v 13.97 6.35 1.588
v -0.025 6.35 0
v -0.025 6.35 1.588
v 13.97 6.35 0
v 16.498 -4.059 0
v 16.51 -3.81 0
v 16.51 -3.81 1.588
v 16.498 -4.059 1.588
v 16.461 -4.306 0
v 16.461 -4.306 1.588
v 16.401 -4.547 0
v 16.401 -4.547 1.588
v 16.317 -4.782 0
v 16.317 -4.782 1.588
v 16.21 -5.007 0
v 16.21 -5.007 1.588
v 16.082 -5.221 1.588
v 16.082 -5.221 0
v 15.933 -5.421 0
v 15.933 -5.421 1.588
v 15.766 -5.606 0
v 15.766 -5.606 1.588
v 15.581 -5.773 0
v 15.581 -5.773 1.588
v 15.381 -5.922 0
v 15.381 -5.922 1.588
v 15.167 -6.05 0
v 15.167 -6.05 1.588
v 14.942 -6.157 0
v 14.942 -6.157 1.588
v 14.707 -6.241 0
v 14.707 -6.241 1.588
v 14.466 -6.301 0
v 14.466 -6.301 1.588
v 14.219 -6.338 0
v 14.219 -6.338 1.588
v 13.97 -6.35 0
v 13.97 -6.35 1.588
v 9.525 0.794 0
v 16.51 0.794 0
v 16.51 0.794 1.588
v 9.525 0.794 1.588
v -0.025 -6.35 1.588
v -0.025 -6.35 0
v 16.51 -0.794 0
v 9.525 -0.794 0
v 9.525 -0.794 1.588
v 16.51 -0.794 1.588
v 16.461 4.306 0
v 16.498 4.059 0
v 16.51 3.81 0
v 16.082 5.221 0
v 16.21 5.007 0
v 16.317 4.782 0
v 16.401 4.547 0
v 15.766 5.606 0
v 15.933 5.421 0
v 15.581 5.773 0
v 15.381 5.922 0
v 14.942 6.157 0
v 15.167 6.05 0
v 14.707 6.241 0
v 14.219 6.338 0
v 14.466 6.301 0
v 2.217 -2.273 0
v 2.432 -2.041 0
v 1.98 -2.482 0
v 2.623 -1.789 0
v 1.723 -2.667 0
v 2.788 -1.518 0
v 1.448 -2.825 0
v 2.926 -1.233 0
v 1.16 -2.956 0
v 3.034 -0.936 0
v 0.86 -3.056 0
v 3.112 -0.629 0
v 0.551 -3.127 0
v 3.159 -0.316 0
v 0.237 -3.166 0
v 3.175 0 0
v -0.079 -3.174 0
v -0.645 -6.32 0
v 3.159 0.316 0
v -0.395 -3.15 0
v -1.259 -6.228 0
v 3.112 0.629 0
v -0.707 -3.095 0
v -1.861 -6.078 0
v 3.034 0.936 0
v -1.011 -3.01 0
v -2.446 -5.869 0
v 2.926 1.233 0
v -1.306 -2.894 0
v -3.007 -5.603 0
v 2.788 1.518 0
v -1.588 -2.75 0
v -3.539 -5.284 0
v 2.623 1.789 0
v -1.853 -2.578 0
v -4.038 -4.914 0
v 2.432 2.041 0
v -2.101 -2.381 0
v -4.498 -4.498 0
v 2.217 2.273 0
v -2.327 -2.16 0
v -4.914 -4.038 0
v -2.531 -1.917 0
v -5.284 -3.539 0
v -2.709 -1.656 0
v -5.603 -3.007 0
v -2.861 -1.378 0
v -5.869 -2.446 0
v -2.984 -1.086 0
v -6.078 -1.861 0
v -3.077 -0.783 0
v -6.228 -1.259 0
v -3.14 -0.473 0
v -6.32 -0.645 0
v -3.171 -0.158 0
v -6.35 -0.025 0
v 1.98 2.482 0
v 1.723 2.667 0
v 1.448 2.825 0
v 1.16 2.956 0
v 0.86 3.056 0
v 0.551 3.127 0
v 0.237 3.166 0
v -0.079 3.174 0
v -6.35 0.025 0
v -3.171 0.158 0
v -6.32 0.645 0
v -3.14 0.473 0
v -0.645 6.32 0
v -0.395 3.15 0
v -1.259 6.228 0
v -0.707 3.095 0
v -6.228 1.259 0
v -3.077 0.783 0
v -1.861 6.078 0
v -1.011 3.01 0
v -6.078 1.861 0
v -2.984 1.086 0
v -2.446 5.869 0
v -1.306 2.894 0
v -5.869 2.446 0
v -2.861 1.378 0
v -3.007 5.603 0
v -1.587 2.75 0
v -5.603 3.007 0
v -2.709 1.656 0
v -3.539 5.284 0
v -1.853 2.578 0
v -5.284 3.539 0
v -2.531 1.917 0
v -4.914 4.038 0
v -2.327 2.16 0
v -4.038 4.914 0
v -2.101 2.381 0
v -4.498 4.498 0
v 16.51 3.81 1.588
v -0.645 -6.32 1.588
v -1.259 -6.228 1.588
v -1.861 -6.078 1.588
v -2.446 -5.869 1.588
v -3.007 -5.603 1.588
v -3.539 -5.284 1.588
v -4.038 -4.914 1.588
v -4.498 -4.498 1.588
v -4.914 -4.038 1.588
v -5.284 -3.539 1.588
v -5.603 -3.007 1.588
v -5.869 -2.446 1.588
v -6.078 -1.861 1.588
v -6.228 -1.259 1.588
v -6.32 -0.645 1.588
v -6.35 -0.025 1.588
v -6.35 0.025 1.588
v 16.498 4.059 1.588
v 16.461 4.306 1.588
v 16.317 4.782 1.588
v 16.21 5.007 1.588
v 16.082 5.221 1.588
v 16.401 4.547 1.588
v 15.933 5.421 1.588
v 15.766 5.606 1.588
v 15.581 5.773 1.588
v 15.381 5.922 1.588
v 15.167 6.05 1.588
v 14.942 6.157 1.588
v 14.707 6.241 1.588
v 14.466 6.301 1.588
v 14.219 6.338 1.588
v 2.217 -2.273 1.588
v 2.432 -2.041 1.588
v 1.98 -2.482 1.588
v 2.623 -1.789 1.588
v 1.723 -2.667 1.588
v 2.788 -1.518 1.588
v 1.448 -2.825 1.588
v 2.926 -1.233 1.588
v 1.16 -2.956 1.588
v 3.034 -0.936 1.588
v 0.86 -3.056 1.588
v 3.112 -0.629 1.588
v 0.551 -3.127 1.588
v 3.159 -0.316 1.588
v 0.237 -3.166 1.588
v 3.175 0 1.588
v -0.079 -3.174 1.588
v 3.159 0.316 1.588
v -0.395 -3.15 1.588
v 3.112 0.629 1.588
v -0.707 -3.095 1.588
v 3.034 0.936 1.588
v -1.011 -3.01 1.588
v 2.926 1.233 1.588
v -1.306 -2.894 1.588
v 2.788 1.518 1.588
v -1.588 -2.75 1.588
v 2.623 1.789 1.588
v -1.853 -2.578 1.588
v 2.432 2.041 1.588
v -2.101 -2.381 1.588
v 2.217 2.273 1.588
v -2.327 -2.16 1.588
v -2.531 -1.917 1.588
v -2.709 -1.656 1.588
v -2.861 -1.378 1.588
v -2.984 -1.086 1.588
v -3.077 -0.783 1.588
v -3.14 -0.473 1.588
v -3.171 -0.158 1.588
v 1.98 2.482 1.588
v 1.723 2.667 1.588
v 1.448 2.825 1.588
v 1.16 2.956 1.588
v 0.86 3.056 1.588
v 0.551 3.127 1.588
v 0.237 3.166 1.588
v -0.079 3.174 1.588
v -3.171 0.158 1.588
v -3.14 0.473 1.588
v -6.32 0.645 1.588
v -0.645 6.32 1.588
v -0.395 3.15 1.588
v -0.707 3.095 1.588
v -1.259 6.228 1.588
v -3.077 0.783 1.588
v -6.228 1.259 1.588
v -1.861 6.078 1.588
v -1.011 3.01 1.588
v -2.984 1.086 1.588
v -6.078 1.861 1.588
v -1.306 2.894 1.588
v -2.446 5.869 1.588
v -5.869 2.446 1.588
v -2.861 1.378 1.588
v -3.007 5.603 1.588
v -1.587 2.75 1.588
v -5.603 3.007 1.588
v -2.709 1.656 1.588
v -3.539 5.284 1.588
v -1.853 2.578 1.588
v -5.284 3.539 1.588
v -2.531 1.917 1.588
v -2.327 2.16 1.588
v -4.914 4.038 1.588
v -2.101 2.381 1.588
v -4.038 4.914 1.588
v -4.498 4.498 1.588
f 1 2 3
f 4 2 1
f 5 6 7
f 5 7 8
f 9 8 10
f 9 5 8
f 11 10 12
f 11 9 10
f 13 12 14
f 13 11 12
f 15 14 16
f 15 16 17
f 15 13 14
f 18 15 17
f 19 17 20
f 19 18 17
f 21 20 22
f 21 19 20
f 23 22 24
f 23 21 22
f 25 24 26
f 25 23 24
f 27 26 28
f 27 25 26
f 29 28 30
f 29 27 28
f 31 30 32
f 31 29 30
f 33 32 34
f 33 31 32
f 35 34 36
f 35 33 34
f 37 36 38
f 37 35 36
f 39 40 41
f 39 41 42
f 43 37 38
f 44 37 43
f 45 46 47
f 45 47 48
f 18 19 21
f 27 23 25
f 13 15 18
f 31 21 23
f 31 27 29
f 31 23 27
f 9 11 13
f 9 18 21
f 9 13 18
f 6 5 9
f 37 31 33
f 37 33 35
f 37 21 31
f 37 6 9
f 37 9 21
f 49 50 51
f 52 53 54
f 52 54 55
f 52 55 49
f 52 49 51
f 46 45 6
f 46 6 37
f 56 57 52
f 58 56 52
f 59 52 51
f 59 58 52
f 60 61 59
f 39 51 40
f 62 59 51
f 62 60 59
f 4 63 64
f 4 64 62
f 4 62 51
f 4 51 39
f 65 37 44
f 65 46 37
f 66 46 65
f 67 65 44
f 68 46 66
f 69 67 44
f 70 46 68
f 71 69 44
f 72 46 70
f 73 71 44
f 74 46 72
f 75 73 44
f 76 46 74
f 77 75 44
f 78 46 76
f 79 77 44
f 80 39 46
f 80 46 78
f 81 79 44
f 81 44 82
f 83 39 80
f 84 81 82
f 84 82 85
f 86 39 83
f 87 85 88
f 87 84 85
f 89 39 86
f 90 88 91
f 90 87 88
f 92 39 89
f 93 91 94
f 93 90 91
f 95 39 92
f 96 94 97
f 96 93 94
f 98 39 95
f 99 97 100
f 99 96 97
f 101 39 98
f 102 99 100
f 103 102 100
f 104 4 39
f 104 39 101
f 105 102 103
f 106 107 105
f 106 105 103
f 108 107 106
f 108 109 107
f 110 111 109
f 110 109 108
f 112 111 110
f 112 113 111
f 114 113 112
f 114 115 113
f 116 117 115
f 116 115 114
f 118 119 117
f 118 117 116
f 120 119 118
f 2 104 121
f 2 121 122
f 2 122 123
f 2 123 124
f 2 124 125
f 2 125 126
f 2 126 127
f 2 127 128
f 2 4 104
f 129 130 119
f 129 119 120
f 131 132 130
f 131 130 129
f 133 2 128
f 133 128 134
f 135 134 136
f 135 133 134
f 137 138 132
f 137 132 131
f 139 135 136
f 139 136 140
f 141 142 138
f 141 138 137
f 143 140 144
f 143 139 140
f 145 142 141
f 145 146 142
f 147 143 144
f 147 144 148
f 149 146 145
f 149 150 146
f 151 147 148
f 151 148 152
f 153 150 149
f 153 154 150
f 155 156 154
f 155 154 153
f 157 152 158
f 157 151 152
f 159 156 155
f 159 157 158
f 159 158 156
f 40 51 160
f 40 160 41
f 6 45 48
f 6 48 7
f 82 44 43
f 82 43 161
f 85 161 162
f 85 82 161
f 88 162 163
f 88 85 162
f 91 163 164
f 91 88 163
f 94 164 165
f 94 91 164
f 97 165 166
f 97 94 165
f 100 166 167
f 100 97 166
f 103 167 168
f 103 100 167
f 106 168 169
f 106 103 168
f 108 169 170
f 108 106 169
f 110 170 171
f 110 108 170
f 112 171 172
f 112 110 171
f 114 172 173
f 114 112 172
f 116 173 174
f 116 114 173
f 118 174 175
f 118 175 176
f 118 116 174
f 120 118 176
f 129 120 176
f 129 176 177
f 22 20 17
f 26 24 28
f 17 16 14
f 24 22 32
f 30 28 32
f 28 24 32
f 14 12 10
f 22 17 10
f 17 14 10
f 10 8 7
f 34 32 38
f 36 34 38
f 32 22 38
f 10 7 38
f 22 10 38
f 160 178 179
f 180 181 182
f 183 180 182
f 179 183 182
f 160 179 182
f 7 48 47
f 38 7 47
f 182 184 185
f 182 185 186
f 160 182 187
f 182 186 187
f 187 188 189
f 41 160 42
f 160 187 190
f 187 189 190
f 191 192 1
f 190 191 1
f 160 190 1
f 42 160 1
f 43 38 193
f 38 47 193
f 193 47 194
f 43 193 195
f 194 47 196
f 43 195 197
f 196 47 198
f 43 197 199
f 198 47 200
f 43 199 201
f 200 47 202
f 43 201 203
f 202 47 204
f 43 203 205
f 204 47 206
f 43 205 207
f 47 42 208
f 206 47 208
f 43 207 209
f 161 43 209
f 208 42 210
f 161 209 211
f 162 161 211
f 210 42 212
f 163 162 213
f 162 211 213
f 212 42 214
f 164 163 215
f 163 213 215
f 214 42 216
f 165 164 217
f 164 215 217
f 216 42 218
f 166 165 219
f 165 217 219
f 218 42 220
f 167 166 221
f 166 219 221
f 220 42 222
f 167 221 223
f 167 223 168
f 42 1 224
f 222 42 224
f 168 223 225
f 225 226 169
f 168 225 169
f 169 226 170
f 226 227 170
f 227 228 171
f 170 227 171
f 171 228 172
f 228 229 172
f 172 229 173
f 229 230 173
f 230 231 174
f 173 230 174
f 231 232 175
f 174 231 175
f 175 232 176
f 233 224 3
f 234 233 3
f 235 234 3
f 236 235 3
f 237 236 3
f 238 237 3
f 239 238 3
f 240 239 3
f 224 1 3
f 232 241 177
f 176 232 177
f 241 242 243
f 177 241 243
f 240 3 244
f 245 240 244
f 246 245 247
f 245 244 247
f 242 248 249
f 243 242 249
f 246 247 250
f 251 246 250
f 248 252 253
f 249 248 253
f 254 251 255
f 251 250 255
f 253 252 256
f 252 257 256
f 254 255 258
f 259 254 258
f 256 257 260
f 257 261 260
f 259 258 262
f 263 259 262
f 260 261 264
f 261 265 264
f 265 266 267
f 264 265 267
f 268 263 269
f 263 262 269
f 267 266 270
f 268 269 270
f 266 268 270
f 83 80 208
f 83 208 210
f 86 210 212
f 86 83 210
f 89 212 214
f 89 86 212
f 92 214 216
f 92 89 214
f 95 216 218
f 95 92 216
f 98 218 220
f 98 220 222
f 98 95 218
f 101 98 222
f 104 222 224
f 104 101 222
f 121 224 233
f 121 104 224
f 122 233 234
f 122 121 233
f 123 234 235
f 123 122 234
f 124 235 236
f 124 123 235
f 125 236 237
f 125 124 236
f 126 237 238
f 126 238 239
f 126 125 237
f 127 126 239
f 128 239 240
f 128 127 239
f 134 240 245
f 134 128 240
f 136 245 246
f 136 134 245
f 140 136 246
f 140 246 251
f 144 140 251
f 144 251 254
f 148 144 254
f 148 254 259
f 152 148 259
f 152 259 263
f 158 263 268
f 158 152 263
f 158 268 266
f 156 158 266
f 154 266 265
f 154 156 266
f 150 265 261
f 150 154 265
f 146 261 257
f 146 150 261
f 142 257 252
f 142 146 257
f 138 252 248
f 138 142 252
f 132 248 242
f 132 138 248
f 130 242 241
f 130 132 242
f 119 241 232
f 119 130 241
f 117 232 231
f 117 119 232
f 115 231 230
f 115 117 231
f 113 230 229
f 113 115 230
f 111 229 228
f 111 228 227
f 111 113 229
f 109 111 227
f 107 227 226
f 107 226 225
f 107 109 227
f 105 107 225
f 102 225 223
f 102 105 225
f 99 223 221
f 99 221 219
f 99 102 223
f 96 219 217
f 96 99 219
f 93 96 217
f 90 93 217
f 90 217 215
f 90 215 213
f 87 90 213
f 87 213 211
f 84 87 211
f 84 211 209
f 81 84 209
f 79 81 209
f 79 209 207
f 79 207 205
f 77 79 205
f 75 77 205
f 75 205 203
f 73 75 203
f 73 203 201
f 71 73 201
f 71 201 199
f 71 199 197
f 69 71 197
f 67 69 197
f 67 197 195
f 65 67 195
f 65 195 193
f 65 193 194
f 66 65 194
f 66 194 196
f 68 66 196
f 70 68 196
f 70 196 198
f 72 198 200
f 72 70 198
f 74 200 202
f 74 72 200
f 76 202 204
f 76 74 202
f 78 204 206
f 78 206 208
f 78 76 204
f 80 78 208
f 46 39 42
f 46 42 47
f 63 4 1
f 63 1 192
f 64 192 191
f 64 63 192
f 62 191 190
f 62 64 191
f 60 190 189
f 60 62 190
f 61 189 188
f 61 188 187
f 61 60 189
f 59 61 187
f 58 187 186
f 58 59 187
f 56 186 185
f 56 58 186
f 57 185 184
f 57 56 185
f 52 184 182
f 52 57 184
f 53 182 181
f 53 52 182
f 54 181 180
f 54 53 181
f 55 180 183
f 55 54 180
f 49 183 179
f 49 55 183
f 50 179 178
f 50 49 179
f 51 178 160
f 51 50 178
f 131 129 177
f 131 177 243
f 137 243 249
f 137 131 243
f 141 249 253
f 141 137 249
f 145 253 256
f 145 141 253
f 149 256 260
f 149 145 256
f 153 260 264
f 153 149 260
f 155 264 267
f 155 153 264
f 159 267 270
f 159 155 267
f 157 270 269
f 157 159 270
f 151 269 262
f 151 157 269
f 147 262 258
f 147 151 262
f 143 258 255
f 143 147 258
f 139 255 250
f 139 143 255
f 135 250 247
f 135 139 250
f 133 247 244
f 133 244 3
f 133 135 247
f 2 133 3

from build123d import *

# Parameters (mm, degrees)
SKETCH1_R           = 3.175
BOSS_EXTRUDE1_DEPTH = 1.5875


with BuildPart() as part:
    # Sketch1 → Boss-Extrude1 (new body)
    with BuildSketch(Plane.XY):
        with BuildLine():
            Line((-0.0254, 6.35), (13.97, 6.35))
            ThreePointArc((13.97, 6.35), (15.766051224, 5.606051224), (16.51, 3.81))
            Line((16.51, 3.81), (16.51, 0.79375))
            Line((16.51, 0.79375), (9.525, 0.79375))
            Line((9.525, 0.79375), (9.525, -0.79375))
            Line((9.525, -0.79375), (16.51, -0.79375))
            Line((16.51, -0.79375), (16.51, -3.81))
            ThreePointArc((16.51, -3.81), (15.766051224, -5.606051224), (13.97, -6.35))
            Line((13.97, -6.35), (-0.0254, -6.35))
            ThreePointArc((-0.0254, -6.35), (-4.497567548, -4.497567548), (-6.35, -0.0254))
            Line((-6.35, -0.0254), (-6.35, 0.0254))
            ThreePointArc((-6.35, 0.0254), (-4.497567548, 4.497567548), (-0.0254, 6.35))
        make_face()
        Circle(SKETCH1_R, mode=Mode.SUBTRACT)
    extrude(amount=BOSS_EXTRUDE1_DEPTH)


solid = part.part
